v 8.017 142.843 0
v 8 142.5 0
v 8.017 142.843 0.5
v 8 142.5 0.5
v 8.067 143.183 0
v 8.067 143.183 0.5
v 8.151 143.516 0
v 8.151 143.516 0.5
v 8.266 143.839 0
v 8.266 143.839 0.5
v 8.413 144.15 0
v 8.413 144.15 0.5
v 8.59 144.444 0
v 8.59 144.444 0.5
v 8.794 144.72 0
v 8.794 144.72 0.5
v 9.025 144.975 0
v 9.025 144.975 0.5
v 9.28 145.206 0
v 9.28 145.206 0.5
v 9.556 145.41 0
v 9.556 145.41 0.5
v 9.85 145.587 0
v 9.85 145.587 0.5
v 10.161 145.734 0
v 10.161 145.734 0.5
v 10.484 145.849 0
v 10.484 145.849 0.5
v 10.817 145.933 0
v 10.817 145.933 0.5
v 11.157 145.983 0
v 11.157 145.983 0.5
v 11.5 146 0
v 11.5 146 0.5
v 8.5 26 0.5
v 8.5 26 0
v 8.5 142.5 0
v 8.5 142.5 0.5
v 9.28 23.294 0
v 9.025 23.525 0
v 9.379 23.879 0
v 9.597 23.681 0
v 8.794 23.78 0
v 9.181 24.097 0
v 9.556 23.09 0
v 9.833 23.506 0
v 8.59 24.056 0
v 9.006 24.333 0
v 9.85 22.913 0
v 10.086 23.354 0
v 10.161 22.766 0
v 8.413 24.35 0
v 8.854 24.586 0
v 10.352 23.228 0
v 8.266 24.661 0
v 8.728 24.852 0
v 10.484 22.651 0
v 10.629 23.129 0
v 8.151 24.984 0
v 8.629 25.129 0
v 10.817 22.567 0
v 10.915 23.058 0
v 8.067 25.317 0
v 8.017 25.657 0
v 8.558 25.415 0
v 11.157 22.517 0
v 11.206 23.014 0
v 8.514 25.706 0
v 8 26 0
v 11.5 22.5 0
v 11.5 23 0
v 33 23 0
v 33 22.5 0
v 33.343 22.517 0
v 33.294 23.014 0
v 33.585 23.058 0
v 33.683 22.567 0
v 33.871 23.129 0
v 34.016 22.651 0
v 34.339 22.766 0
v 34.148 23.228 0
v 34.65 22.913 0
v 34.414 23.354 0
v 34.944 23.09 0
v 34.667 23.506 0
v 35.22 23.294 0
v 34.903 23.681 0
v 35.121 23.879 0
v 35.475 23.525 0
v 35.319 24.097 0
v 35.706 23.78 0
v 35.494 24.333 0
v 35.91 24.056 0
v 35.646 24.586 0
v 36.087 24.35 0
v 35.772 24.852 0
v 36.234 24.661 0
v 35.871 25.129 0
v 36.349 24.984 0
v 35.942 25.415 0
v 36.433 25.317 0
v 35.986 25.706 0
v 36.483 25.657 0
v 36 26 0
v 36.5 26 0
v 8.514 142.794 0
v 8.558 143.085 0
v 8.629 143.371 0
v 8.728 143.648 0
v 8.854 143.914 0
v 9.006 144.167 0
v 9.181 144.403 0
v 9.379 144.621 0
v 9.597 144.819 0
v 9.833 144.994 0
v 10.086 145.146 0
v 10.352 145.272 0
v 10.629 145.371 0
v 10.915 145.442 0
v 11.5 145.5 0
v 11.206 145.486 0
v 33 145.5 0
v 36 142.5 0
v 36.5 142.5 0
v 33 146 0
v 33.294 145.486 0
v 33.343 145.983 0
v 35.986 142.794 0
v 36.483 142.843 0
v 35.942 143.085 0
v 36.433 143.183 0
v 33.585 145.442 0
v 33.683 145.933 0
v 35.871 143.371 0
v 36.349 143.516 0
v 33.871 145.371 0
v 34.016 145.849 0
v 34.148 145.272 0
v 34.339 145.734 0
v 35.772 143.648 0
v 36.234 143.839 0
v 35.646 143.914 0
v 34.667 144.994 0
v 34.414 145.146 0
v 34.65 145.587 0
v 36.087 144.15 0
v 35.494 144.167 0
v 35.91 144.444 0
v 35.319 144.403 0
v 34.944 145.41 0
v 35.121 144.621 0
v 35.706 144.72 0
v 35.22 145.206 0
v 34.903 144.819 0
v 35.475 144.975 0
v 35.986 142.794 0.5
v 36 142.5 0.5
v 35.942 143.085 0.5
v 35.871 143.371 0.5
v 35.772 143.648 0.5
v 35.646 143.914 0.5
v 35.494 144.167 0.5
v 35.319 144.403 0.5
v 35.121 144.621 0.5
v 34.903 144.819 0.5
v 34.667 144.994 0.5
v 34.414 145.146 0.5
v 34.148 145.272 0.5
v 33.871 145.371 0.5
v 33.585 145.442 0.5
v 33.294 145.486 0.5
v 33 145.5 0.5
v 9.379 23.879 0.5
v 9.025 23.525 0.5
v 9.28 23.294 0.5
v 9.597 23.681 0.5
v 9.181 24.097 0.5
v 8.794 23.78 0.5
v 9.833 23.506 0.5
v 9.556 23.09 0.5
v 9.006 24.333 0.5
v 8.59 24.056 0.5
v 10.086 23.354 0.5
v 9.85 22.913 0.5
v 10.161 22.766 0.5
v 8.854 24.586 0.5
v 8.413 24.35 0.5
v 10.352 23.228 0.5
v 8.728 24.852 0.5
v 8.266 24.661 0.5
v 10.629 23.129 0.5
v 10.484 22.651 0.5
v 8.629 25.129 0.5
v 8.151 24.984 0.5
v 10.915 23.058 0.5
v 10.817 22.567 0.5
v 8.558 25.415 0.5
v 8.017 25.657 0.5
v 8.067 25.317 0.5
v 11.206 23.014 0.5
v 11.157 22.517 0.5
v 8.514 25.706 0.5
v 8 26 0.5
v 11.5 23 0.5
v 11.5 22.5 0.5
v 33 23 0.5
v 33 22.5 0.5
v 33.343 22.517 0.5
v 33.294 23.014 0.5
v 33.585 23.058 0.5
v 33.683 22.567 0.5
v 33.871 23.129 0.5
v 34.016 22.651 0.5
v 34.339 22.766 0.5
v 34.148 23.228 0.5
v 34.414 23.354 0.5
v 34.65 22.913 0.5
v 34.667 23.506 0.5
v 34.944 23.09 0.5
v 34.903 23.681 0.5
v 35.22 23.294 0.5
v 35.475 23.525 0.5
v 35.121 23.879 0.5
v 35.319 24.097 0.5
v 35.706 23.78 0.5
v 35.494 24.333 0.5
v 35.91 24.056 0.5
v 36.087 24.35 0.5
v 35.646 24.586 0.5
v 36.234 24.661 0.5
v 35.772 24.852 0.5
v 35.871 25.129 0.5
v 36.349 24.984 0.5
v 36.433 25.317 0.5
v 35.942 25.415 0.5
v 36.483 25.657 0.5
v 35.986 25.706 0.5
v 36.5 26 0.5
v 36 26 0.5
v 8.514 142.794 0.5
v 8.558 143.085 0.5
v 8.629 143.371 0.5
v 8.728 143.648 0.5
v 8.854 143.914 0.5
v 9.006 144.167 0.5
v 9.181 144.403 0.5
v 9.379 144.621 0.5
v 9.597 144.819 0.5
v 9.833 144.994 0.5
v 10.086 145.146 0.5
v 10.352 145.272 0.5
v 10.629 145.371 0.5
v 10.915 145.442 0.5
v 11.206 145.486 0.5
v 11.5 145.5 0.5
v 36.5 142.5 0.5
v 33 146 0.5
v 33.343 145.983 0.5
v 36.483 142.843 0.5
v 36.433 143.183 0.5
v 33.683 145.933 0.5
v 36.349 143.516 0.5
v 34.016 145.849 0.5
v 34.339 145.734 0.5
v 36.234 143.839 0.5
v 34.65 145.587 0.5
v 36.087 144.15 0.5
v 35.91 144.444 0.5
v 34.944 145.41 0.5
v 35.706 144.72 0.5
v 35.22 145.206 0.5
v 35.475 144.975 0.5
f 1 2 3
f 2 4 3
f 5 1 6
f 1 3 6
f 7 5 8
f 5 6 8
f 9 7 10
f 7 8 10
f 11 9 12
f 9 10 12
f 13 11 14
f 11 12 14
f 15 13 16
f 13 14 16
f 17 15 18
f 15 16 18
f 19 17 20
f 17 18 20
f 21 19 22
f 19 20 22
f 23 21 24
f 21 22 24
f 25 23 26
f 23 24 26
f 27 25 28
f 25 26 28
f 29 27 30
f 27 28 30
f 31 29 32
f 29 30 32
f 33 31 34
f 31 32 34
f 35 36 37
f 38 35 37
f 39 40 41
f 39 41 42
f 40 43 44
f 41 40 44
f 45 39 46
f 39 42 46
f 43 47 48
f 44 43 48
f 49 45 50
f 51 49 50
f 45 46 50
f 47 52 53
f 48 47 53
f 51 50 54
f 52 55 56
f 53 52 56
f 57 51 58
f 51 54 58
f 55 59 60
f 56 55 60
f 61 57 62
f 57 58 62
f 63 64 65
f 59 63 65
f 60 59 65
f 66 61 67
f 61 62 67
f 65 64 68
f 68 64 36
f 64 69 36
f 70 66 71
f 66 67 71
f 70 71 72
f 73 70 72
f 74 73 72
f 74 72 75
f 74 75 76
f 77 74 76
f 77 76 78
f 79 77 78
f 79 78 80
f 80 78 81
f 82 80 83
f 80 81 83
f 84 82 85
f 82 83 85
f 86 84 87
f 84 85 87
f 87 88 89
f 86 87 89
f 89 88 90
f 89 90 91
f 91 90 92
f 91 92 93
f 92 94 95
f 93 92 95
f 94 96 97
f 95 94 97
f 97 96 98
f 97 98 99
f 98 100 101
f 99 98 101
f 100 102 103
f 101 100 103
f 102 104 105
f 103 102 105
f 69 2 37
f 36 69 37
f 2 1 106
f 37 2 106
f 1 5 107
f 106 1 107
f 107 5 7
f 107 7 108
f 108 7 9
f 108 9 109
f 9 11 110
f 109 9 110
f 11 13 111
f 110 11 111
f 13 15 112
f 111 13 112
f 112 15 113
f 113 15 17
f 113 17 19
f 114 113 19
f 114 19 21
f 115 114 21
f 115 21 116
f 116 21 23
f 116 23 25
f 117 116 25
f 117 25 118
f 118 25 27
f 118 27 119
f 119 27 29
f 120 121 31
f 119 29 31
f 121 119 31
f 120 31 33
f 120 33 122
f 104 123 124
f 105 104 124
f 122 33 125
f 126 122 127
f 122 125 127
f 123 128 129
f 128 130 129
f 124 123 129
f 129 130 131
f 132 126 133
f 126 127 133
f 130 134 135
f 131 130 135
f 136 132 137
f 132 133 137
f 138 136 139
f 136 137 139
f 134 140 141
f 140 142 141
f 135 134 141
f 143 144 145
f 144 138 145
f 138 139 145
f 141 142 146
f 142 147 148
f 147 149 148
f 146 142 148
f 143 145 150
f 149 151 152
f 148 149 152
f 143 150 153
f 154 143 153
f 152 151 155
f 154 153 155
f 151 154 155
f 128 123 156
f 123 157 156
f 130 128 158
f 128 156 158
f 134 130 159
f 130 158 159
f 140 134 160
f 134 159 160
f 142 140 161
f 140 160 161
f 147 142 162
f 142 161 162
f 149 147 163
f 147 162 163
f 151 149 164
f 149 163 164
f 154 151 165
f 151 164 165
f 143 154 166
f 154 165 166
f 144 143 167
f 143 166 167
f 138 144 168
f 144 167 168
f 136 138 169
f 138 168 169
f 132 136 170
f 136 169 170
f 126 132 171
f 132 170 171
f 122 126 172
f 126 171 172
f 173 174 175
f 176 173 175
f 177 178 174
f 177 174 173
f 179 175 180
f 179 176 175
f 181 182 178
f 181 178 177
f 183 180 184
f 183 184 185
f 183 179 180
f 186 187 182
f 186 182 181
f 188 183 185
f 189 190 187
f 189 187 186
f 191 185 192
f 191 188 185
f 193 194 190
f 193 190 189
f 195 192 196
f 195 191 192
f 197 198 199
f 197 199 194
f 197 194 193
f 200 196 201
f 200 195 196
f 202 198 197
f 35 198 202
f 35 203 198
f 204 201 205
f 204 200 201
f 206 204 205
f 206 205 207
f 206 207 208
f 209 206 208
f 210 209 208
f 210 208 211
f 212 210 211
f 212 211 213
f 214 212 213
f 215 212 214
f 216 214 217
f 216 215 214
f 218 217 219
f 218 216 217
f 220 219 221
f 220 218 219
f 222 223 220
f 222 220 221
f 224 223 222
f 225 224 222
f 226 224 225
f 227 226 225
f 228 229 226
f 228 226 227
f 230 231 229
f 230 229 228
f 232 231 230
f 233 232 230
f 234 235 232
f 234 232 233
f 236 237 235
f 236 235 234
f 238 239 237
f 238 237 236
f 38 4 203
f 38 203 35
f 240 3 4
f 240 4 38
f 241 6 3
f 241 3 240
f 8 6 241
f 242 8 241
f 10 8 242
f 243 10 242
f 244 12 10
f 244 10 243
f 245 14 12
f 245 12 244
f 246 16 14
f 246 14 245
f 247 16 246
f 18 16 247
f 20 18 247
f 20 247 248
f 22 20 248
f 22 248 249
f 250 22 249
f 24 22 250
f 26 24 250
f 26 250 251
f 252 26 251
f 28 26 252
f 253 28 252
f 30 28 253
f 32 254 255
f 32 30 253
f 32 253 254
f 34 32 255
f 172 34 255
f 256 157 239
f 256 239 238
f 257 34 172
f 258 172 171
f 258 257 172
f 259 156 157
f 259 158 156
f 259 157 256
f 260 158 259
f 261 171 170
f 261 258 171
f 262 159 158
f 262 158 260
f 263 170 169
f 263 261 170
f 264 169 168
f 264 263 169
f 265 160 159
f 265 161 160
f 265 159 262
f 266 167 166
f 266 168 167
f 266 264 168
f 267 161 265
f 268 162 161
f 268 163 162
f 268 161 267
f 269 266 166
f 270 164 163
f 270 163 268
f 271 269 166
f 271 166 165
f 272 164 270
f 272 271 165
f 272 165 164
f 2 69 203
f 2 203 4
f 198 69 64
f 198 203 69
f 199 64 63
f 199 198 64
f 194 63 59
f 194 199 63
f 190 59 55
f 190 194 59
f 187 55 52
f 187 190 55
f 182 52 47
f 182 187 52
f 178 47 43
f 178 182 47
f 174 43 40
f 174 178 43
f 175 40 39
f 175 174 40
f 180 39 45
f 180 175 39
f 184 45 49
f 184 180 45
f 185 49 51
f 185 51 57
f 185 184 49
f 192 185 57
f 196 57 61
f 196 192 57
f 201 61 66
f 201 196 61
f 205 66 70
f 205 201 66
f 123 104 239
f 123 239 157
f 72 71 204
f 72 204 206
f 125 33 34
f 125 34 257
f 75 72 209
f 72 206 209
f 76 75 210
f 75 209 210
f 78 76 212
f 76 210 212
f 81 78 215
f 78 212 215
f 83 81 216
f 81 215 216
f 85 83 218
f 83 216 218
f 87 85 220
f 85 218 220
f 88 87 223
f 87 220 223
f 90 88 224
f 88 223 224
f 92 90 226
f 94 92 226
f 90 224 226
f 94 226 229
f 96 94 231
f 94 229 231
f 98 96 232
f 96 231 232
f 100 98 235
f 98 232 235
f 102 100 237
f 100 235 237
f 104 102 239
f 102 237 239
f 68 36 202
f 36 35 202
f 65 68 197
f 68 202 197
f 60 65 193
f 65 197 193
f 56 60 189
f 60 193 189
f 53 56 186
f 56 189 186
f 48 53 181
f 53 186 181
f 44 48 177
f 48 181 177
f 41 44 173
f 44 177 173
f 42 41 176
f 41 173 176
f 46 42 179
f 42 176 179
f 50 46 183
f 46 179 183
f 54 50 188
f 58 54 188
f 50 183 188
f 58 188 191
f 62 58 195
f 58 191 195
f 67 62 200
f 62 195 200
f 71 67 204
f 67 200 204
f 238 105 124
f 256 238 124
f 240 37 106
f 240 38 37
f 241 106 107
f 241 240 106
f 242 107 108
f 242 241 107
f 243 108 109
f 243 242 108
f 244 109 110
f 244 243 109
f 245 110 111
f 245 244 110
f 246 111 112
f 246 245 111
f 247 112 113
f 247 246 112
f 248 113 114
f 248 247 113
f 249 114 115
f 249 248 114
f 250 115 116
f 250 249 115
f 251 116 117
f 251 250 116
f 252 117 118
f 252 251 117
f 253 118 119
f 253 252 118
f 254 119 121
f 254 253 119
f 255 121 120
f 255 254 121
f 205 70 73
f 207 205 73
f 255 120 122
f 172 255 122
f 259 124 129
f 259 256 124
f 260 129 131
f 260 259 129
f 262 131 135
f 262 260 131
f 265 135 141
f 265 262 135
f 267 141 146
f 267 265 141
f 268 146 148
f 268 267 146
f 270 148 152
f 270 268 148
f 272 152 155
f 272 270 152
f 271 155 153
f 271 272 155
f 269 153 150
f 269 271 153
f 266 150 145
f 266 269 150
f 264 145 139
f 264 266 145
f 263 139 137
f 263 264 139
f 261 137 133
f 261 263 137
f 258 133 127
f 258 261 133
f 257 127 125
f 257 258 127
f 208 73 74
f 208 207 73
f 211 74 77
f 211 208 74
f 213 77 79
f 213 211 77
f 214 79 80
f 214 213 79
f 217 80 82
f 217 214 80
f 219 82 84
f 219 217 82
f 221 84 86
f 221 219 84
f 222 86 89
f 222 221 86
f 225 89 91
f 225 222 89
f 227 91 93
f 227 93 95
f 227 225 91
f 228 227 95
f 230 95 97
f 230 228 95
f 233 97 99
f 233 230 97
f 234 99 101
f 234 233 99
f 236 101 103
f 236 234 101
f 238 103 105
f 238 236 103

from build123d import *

# Parameters (mm, degrees)
BOX008_W     = 27.5
BOX008_H     = 122.5
BOX008_DEPTH = 0.5
FILLET005_R  = 3
BOX007_W     = 28.5
BOX007_H     = 123.5
BOX007_DEPTH = 0.5
FILLET004_R  = 3.5


with BuildPart() as fillet005:
    # Box008 → Box008 (new body)
    with BuildSketch(Plane(origin=(8, 22, 0), x_dir=(1, 0, 0), z_dir=(0, 0, 1))):
        with Locations((13.75, 61.25)):
            Rectangle(BOX008_W, BOX008_H)
    extrude(amount=BOX008_DEPTH)

    # Fillet005
    fillet005_edges = [fillet005.edges().sort_by_distance(p)[0] for p in [
        (8, 22, 0.25),
        (8, 144.5, 0.25),
        (35.5, 22, 0.25),
        (35.5, 144.5, 0.25),
    ]]
    fillet(fillet005_edges, radius=FILLET005_R)


with BuildPart() as fillet005_1:
    # Fillet005 placement: moved
    add(fillet005.part.moved(Location((0.5, 1, 0))))


with BuildPart() as cut005:
    # Box007 → Box007 (new body)
    with BuildSketch(Plane(origin=(8.5, 22.5, 0), x_dir=(1, 0, 0), z_dir=(0, 0, 1))):
        with Locations((14.25, 61.75)):
            Rectangle(BOX007_W, BOX007_H)
    extrude(amount=BOX007_DEPTH)

    # Fillet004
    fillet004_edges = [cut005.edges().sort_by_distance(p)[0] for p in [
        (8.5, 22.5, 0.25),
        (8.5, 146, 0.25),
        (37, 22.5, 0.25),
        (37, 146, 0.25),
    ]]
    fillet(fillet004_edges, radius=FILLET004_R)


with BuildPart() as cut005_1:
    # Fillet004 placement: moved
    add(cut005.part.moved(Location((-0.5, 0, 0))))

    # Cut005: cut Fillet005
    add(fillet005_1.part, mode=Mode.SUBTRACT)


solid = cut005_1.part
